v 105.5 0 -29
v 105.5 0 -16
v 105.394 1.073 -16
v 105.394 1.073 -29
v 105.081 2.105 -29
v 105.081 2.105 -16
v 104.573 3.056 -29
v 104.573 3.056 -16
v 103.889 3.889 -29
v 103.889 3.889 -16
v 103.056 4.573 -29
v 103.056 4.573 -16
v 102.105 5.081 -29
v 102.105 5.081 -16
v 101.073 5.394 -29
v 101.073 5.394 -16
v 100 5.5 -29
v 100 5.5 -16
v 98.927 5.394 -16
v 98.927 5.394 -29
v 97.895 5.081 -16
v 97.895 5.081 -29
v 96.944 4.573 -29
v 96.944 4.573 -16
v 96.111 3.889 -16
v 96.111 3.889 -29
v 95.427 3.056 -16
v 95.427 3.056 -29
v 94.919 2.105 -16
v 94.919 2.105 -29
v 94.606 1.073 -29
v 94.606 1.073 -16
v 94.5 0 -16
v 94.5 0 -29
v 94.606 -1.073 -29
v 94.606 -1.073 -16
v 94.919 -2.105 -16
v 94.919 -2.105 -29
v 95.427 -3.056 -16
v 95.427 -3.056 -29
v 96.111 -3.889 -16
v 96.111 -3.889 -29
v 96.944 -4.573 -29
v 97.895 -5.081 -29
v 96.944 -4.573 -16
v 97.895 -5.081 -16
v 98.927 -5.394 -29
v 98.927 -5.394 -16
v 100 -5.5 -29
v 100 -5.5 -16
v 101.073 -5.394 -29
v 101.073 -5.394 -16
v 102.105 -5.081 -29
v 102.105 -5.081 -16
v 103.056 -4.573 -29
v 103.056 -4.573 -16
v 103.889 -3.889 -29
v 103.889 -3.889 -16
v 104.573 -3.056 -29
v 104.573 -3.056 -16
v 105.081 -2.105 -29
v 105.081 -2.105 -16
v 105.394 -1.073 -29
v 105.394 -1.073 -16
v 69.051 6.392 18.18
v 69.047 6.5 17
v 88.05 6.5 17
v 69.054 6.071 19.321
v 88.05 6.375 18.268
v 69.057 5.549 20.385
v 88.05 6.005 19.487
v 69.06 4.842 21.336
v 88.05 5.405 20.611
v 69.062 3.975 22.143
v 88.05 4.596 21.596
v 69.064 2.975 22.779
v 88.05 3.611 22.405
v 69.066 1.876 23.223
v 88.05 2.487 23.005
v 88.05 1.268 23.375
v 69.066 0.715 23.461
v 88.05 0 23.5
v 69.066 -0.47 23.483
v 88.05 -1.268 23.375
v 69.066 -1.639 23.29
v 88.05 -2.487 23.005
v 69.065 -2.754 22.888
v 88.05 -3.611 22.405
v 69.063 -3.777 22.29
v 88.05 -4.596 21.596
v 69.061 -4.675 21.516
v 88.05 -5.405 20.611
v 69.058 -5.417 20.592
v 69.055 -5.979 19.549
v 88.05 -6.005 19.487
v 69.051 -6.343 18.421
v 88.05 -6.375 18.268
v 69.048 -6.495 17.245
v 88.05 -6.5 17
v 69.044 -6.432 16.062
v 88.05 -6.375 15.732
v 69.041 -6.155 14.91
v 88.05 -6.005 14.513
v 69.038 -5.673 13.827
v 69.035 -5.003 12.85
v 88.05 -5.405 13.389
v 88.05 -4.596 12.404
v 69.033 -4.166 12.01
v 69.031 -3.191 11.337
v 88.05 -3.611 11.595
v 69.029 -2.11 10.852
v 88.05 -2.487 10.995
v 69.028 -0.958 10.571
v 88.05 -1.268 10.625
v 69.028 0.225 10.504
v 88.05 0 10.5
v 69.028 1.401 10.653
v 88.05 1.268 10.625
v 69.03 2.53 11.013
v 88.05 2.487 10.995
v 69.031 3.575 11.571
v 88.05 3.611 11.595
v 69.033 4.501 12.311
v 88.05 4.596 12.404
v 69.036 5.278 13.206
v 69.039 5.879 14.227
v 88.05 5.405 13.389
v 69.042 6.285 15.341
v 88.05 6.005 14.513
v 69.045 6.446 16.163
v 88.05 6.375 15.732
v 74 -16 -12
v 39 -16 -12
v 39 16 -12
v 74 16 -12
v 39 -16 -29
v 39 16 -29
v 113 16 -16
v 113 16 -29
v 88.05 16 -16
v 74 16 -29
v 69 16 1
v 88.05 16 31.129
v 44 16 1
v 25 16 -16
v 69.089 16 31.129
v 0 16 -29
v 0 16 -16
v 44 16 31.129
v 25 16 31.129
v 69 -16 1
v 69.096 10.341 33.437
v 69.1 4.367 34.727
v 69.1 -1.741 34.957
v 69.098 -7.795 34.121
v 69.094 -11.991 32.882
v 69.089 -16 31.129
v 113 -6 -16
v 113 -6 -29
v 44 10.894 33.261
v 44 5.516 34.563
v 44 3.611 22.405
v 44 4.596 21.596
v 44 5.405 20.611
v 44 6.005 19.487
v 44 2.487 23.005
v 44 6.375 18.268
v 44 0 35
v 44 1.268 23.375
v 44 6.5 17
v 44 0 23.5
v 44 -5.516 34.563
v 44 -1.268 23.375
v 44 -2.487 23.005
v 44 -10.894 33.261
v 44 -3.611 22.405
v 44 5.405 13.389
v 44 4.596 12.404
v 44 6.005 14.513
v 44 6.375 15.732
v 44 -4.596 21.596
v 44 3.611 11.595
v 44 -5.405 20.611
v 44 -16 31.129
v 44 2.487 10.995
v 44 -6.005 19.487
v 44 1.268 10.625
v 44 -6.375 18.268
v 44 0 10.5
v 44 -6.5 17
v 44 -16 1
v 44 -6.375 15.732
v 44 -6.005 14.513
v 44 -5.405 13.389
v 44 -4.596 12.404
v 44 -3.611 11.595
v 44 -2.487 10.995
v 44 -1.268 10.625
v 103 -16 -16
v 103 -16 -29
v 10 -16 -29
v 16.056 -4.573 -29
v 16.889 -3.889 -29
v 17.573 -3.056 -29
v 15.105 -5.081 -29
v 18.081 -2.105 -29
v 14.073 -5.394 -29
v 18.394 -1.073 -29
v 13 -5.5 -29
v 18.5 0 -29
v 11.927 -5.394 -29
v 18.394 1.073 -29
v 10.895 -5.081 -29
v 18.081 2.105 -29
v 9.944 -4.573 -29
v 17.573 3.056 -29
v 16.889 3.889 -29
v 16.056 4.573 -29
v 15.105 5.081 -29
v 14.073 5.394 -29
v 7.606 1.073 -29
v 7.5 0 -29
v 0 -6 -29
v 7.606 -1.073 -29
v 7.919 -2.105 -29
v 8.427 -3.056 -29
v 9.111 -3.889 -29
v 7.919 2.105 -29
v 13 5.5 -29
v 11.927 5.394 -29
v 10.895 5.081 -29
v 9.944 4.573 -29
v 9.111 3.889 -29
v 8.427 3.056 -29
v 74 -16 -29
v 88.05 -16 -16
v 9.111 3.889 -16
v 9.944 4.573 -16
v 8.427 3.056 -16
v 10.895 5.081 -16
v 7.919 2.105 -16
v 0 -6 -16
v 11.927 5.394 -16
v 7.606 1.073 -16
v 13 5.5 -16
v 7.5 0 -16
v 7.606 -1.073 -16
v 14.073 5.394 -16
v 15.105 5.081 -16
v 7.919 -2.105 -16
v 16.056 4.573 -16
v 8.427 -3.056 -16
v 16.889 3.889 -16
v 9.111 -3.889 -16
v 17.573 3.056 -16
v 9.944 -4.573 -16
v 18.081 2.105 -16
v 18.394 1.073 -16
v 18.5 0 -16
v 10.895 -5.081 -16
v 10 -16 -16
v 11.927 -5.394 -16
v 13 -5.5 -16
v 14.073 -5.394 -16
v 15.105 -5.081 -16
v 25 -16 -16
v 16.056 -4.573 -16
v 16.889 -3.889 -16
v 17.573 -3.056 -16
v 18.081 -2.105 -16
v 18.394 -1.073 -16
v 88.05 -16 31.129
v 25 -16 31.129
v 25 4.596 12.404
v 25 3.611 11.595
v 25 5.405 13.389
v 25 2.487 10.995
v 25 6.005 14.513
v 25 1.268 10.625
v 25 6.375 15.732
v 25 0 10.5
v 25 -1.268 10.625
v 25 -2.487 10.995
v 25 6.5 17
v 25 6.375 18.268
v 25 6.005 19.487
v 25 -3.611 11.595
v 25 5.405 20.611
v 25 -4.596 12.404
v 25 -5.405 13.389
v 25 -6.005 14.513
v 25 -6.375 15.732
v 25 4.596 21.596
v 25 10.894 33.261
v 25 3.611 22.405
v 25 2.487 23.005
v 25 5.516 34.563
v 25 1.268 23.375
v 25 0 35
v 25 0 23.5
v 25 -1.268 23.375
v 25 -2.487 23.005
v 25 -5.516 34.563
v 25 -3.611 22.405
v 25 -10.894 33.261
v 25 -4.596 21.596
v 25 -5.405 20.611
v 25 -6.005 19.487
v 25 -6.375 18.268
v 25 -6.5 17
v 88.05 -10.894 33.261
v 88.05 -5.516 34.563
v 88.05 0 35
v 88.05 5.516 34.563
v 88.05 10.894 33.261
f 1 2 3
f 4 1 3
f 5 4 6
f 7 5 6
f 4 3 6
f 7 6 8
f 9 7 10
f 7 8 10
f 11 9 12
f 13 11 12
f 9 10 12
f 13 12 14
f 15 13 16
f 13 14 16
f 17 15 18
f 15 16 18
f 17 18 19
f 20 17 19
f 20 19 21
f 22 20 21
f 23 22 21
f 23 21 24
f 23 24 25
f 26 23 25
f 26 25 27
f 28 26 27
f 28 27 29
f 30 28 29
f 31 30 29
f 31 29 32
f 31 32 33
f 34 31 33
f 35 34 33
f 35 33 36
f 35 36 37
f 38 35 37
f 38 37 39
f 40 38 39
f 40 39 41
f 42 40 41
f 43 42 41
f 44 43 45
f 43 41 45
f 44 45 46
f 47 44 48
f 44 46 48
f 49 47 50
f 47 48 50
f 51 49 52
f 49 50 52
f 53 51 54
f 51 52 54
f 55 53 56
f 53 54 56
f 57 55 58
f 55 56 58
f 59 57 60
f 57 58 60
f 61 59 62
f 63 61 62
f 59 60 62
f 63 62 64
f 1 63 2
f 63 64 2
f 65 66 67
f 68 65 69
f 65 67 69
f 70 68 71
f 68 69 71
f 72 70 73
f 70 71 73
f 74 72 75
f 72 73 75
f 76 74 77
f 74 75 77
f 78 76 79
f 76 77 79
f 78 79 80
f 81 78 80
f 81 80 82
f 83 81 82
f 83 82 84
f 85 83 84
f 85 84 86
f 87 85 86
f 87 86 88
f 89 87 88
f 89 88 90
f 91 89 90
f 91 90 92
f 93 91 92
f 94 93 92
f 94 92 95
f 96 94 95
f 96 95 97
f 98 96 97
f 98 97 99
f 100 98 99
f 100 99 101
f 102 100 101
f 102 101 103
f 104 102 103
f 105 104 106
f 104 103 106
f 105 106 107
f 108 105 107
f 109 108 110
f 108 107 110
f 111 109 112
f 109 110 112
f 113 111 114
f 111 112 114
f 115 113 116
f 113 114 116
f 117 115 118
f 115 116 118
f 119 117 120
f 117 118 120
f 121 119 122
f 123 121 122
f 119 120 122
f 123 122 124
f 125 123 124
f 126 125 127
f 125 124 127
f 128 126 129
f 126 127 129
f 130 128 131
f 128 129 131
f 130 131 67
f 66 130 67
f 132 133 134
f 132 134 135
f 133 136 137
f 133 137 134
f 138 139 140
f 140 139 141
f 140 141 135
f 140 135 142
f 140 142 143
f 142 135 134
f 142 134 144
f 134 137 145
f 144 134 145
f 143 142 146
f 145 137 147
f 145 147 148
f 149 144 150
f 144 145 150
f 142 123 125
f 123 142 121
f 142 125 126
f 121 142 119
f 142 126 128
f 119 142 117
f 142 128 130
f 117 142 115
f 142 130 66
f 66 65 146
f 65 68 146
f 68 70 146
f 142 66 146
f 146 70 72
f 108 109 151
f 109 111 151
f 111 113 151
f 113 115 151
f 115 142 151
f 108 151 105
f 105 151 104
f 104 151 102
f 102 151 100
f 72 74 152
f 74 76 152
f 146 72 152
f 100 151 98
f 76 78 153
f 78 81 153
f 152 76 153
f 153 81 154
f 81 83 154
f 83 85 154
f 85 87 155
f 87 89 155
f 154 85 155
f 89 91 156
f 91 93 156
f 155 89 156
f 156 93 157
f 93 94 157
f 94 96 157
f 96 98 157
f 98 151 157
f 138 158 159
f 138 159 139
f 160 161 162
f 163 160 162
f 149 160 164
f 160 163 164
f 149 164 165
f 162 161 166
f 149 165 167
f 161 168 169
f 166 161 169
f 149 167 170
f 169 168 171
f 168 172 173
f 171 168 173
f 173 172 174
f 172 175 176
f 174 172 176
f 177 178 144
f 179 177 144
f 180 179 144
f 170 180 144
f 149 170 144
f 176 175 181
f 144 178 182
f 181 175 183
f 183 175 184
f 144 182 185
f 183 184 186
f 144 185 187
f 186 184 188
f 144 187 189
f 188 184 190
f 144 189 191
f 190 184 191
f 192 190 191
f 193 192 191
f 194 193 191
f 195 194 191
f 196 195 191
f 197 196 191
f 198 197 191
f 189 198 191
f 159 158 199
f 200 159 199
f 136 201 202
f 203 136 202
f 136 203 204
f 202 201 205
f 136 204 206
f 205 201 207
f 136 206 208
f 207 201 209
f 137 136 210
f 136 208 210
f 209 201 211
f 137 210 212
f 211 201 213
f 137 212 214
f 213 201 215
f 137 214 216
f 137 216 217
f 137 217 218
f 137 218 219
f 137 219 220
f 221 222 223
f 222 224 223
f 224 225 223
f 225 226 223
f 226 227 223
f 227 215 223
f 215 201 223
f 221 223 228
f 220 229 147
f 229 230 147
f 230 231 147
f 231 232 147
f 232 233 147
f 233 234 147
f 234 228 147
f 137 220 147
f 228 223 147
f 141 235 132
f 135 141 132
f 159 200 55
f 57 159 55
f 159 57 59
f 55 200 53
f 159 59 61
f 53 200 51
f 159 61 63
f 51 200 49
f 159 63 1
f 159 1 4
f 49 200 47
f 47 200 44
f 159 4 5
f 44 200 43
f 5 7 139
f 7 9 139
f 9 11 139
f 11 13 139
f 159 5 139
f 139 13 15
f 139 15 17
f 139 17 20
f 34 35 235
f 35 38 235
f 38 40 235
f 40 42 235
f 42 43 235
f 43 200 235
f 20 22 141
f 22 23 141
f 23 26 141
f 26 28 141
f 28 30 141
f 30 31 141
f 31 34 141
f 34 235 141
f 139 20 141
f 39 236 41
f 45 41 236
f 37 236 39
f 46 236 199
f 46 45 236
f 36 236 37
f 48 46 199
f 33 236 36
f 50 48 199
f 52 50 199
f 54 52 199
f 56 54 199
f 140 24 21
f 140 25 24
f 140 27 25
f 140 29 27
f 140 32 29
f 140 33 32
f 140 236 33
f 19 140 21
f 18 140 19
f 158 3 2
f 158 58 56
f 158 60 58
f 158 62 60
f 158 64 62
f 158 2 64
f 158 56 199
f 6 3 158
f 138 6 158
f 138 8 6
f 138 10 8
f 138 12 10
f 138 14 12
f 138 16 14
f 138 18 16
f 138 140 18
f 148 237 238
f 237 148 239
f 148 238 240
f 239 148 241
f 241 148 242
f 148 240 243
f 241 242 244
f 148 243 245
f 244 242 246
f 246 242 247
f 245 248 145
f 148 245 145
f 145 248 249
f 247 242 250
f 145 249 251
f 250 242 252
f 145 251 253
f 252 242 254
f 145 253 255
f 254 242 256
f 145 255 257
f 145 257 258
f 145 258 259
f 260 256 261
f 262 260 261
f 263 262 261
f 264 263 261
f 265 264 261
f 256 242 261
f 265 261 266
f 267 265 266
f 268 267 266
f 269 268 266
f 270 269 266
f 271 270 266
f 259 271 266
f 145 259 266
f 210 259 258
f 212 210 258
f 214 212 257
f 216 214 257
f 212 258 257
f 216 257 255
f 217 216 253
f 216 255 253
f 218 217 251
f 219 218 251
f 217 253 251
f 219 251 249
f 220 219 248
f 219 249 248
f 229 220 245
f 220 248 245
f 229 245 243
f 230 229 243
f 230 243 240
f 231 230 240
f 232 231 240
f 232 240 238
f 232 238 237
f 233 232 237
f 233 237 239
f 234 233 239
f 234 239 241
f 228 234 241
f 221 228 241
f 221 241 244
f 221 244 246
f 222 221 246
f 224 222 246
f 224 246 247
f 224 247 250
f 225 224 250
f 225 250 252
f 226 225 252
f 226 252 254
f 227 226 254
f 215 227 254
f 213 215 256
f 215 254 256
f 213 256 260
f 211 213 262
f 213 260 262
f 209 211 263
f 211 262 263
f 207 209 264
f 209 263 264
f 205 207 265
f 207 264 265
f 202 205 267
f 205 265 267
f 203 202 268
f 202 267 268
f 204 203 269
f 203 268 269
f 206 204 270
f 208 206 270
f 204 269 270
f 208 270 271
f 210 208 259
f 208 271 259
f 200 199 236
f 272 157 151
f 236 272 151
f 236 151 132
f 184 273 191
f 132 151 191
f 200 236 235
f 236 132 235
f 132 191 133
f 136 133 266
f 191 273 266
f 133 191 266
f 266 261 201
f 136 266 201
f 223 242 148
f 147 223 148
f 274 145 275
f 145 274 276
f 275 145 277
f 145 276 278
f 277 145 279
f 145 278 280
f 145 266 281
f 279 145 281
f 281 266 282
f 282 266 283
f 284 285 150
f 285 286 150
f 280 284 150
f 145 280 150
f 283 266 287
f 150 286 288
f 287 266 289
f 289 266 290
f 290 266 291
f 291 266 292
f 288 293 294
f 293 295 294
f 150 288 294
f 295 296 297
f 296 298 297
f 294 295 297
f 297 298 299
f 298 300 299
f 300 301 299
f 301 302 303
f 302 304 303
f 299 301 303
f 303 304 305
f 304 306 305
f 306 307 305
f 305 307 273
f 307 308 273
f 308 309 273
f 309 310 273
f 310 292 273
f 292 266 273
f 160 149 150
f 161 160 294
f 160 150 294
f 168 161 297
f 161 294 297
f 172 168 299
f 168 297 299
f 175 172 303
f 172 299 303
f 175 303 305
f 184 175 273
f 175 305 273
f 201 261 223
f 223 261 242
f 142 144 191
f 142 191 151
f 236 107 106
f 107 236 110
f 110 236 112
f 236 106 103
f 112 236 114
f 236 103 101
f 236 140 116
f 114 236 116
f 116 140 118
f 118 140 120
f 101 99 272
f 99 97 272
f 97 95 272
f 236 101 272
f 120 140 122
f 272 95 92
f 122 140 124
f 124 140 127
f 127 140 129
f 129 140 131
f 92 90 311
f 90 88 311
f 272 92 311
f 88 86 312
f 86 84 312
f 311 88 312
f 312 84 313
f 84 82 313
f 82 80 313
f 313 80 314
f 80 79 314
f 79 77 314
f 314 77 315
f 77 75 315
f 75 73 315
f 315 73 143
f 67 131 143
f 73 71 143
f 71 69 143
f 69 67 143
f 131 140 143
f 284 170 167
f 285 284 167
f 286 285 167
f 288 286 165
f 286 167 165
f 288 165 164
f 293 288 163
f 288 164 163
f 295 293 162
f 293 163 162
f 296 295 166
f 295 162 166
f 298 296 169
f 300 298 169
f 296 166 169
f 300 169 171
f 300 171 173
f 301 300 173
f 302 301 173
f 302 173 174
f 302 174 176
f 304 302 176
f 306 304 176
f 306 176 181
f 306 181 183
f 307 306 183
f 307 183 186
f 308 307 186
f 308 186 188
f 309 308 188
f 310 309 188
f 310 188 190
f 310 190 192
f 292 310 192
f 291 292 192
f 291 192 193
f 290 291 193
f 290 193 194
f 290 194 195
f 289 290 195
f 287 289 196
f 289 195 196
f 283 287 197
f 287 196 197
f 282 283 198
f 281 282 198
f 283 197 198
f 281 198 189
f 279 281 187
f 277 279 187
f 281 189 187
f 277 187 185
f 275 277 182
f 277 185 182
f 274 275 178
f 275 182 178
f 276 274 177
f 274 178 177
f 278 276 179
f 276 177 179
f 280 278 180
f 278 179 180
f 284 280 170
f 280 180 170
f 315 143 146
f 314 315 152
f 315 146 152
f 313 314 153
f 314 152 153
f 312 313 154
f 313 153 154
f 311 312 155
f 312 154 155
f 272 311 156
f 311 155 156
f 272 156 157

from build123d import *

# Parameters (mm, degrees)
F1_DEPTH      = 113
F2_R          = 6.5
F3_DEPTH      = 113.001
F4_W          = 35
F4_H          = 17
F5_DEPTH      = 32.001
F6_W          = 25
F6_H          = 51
F7_DEPTH      = 16.001
F7_DEPTH_BACK = 16.001
F8_R          = 5.5
F9_DEPTH      = 29.001


with BuildPart() as f1:
    # F0 (on Right) → F1 (new body)
    with BuildSketch(Plane.YZ):
        with BuildLine():
            ThreePointArc((16, 31.128765), (0, 35), (-16, 31.128765))
            Line((-16, 31.128765), (-16, -29))
            Line((-16, -29), (16, -29))
            Line((16, -29), (16, 31.128765))
        make_face()
    extrude(amount=F1_DEPTH)

    # F2 (on face) → F3 (cut, through all)
    with BuildSketch(Plane.YZ.offset(113)):
        with Locations((0, 17)):
            Circle(F2_R)
    extrude(amount=-F3_DEPTH, mode=Mode.SUBTRACT)

    # F4 (on face) → F5 (cut, through all)
    with BuildSketch(Plane.XZ.offset(16)):
        with Locations((56.5, -20.5)):
            Rectangle(F4_W, F4_H)
        Polygon((44, 1), (69, 1), (69.100894, 35.176743), (44, 35.176743), align=None)
    extrude(amount=-F5_DEPTH, mode=Mode.SUBTRACT)

    # F6 (on Front) → F7 (cut, two sides)
    with BuildSketch(Plane.XZ) as f7_sk:
        with Locations((12.5, 9.5)):
            Rectangle(F6_W, F6_H)
        with Locations((100.550447, 9.5)):
            Rectangle(F6_W, F6_H)
    extrude(amount=F7_DEPTH, mode=Mode.SUBTRACT)
    extrude(f7_sk.sketch, amount=-F7_DEPTH_BACK, mode=Mode.SUBTRACT)

    # F8 (on Top) → F9 (cut, through all)
    with BuildSketch(Plane.XY):
        Polygon((10, -16), (0, -6), (0, -16), align=None)
        with Locations((13, 0)):
            Circle(F8_R)
        with Locations((100, 0)):
            Circle(F8_R)
        Polygon((113, -6), (103, -16), (113, -16), align=None)
    extrude(amount=-F9_DEPTH, mode=Mode.SUBTRACT)


solid = f1.part
